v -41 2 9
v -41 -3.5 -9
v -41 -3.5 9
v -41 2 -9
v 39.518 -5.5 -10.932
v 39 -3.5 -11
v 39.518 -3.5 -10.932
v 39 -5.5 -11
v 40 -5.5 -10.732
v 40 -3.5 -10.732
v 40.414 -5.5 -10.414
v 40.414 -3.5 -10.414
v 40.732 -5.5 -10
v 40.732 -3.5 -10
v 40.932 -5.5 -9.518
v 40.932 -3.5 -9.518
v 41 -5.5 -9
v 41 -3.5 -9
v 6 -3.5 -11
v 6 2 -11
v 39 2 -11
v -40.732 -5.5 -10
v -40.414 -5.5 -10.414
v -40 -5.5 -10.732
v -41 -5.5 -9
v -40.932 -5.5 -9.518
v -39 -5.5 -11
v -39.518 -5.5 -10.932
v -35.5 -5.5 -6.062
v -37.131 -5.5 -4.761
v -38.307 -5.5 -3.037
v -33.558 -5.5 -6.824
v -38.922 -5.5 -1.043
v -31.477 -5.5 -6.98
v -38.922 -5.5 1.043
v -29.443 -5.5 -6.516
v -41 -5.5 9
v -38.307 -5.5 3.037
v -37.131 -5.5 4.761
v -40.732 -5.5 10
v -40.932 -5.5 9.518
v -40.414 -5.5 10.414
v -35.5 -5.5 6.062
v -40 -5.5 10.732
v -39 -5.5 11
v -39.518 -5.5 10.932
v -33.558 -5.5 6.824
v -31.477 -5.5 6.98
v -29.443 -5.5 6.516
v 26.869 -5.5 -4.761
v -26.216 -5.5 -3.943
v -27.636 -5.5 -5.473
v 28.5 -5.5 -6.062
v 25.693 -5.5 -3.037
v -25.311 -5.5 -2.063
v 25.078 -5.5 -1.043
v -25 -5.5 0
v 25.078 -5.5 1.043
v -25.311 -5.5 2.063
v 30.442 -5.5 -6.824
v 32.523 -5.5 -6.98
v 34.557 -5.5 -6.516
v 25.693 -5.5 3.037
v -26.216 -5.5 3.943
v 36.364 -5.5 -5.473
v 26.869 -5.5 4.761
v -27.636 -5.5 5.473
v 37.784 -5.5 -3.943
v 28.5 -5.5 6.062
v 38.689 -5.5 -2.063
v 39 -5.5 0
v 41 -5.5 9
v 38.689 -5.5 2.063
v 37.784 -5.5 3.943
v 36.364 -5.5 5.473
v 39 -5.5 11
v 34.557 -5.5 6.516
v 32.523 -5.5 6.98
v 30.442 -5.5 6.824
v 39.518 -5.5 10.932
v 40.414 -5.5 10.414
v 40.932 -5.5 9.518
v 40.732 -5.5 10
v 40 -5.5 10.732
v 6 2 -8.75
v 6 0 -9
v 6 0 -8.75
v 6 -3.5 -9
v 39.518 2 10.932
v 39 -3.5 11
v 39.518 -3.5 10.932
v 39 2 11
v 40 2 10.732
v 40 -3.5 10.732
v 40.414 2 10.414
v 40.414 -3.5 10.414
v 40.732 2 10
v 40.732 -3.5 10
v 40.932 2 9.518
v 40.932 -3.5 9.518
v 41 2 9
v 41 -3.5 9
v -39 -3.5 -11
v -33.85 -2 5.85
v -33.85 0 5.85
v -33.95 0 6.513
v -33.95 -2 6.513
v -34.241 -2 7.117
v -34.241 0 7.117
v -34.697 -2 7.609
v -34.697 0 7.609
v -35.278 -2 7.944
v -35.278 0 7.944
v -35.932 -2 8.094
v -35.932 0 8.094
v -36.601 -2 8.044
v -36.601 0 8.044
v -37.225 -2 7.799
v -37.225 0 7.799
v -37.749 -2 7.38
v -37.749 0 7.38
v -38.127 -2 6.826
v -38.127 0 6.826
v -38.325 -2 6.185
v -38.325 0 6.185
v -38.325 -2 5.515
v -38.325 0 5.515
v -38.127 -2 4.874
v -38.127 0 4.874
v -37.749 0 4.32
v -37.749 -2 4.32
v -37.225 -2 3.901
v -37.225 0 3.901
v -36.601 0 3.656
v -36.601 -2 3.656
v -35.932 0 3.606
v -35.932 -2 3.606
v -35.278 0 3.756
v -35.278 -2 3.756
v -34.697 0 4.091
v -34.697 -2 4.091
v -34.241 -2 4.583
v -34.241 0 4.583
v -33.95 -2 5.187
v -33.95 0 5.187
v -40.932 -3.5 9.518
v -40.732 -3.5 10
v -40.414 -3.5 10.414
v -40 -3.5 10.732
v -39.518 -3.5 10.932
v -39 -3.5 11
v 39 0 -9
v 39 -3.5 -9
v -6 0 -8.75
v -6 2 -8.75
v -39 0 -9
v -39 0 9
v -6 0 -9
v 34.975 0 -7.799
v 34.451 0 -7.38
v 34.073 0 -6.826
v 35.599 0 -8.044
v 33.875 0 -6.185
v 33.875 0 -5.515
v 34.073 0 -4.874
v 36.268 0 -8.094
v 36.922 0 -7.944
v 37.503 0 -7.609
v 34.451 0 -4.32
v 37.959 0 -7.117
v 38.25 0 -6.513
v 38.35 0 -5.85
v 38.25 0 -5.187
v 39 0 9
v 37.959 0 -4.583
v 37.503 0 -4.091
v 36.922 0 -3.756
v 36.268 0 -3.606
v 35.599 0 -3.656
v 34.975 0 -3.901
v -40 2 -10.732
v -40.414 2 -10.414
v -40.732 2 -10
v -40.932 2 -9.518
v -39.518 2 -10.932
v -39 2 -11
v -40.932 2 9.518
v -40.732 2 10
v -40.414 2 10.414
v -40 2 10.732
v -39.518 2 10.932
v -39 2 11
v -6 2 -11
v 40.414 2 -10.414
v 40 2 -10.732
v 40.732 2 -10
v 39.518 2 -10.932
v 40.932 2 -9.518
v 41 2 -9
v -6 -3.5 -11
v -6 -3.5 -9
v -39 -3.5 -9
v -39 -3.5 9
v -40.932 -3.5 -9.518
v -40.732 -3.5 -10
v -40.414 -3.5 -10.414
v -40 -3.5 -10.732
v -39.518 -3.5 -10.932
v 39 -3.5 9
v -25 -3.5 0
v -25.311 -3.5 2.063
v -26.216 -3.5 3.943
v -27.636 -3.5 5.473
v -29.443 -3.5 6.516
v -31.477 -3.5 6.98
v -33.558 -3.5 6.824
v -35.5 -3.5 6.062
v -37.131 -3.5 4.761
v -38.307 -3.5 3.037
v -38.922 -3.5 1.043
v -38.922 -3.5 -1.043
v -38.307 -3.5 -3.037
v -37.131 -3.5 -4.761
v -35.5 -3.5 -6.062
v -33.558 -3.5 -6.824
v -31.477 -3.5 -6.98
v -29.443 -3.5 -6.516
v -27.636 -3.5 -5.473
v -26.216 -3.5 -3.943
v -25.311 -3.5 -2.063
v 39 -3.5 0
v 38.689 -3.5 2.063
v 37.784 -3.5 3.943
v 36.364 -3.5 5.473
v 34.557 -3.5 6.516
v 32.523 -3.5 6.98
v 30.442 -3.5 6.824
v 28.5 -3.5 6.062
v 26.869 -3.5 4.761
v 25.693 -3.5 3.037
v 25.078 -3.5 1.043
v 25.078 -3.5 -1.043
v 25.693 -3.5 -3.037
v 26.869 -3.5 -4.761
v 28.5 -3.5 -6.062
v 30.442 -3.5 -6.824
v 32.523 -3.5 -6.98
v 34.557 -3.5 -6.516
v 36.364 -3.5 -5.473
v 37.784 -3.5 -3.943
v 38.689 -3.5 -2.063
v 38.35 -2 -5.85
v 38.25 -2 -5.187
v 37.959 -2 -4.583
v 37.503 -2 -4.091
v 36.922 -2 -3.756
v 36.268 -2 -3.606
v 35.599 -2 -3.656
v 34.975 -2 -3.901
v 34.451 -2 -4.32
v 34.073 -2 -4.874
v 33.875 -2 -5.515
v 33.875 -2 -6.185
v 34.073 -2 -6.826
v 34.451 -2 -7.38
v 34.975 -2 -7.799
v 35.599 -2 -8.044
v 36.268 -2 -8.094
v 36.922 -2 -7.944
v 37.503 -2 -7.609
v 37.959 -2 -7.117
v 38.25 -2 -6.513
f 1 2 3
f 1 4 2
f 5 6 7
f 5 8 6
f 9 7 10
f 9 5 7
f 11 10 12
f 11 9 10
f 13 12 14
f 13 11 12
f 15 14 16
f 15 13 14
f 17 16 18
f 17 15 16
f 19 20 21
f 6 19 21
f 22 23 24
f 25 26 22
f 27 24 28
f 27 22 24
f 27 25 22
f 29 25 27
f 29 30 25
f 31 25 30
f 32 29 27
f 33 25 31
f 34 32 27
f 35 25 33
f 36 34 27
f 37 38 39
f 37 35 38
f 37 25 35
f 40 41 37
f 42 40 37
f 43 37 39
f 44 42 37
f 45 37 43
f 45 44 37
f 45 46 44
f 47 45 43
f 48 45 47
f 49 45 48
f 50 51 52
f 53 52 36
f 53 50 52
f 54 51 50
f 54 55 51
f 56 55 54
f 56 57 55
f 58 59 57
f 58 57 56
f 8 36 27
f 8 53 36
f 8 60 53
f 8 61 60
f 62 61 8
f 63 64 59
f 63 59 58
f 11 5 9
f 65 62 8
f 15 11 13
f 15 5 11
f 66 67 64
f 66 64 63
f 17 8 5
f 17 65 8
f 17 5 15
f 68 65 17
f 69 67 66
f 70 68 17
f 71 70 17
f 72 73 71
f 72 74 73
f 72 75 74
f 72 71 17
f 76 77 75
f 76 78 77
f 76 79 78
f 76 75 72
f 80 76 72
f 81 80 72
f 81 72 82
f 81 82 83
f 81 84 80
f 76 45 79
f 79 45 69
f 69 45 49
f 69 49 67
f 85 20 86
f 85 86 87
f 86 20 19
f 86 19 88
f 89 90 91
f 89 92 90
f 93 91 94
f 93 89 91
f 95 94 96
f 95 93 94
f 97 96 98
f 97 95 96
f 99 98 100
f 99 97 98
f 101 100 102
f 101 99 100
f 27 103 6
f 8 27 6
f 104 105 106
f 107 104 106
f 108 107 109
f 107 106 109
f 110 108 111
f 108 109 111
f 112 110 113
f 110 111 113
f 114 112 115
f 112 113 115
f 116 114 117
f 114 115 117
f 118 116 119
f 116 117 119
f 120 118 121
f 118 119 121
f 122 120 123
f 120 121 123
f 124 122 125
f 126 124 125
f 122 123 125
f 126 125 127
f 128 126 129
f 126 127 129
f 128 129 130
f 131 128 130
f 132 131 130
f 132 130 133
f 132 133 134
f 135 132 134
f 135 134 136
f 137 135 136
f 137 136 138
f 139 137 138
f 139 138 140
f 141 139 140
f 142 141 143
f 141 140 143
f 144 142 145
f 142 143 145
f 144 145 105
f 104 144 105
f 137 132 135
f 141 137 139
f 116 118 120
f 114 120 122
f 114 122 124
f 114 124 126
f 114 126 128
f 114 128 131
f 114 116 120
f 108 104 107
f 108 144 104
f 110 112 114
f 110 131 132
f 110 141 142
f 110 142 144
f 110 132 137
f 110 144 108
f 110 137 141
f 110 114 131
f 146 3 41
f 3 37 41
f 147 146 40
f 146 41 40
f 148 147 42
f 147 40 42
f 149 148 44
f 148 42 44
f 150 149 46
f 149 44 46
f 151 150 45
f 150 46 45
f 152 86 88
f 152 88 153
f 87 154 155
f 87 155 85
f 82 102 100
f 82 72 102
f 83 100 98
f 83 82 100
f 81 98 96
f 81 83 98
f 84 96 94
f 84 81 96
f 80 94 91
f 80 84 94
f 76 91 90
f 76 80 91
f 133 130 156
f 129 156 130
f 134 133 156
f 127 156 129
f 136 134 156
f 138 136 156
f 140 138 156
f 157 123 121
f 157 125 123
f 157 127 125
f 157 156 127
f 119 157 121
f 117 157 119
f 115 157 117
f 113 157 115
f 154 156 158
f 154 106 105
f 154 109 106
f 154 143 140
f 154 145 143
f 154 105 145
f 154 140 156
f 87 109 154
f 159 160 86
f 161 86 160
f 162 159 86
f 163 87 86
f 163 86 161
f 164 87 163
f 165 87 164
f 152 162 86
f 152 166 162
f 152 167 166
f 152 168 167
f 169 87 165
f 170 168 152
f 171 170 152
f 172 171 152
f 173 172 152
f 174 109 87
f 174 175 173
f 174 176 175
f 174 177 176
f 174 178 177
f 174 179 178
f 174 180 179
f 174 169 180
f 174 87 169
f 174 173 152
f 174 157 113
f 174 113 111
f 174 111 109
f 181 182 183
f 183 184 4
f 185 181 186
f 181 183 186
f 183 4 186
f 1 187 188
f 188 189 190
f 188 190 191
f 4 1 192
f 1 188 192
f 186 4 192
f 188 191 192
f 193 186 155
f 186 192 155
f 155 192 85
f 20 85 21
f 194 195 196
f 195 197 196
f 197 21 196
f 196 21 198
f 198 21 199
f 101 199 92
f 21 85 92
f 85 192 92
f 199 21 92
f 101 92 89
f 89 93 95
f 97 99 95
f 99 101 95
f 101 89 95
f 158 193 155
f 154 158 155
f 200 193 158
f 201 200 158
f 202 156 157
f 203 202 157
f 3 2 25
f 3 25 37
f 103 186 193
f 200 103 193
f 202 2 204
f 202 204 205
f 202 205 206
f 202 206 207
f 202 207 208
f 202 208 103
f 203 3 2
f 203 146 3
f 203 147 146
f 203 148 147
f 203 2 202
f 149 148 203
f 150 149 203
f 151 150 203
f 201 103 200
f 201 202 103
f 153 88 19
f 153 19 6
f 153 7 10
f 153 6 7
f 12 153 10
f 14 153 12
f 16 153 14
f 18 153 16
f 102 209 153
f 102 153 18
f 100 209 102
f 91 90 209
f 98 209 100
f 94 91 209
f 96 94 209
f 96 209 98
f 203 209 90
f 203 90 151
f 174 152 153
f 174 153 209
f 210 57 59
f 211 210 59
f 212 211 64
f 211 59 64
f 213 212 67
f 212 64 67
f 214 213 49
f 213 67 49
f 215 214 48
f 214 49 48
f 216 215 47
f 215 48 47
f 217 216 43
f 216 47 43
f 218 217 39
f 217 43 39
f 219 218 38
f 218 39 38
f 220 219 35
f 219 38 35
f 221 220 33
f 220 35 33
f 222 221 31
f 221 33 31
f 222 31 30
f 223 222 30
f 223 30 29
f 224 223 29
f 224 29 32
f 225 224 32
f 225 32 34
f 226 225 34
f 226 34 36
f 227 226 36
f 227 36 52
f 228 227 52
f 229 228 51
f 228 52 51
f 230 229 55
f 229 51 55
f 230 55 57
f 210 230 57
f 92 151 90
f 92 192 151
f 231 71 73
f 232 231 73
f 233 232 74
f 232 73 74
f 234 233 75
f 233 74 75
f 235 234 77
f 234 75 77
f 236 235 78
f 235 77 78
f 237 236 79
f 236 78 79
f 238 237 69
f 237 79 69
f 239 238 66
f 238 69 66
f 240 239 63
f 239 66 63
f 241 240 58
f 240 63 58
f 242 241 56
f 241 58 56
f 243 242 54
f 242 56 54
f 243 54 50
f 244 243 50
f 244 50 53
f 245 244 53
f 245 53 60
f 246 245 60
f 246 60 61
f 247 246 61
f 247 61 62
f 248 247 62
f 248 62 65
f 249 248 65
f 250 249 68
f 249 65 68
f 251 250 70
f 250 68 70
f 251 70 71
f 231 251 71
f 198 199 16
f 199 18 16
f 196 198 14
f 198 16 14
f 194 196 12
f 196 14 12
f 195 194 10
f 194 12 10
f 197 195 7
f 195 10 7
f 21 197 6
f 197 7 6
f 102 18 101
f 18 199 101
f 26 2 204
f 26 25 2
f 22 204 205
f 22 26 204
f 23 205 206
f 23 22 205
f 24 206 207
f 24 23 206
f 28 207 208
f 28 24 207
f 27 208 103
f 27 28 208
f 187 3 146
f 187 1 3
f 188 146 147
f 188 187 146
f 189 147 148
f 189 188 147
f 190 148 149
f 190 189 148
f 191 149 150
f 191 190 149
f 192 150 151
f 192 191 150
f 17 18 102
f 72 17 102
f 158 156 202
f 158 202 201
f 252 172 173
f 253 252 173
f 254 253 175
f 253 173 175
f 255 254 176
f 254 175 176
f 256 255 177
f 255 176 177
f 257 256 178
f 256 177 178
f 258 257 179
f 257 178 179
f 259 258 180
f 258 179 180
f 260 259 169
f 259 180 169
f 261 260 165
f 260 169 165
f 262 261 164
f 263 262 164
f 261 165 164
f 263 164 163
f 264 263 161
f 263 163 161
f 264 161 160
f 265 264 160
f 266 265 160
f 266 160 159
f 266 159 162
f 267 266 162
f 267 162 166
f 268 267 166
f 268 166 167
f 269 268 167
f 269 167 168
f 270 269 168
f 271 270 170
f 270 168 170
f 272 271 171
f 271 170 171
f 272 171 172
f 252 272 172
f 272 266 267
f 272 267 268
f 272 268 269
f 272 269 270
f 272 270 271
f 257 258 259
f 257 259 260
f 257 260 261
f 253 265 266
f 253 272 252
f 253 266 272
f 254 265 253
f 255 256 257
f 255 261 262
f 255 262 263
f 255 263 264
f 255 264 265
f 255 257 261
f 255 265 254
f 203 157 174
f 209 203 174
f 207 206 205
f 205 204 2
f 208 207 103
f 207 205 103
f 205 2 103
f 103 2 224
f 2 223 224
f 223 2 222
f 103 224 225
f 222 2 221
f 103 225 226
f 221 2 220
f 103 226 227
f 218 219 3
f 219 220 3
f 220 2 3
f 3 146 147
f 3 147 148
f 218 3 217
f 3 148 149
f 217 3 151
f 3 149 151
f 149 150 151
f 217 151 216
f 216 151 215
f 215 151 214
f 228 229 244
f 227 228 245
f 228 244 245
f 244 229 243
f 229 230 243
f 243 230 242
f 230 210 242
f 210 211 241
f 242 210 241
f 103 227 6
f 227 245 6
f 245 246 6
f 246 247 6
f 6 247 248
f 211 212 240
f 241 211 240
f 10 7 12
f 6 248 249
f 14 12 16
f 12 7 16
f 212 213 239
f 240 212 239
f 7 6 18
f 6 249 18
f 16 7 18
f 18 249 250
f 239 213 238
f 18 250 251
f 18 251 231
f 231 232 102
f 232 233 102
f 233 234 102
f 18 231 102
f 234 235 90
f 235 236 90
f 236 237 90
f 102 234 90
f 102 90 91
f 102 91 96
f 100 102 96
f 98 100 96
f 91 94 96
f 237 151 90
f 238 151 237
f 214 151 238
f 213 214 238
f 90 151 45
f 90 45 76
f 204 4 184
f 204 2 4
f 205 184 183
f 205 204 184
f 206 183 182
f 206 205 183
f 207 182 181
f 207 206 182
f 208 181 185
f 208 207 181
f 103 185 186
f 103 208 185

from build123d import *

# Parameters (mm, degrees)
F0_W      = 82
F0_H      = 22
F2_DEPTH  = 2
F1_R      = 2.25
F3_DEPTH  = 2
F4_W      = 82
F4_H      = 22
F4_W_2    = 78
F4_H_2    = 18
F5_DEPTH  = 3.5
F6_W      = 12
F6_H      = 2.5
F7_DEPTH  = 5.5
F8_R      = 2
F9_W      = 82
F9_H      = 22
F10_DEPTH = 2
F11_R     = 2
F12_R     = 7
F13_DEPTH = 2


with BuildPart() as f2:
    # F0 (on Front) → F2 (new body)
    with BuildSketch(Plane.XZ):
        Rectangle(F0_W, F0_H)
    extrude(amount=-F2_DEPTH)

    # F1 (on Front) → F3 (join)
    with BuildSketch(Plane.XZ):
        with Locations((-36.1, 5.85)):
            Circle(F1_R)
        with Locations((36.1, -5.85)):
            Circle(F1_R)
    extrude(amount=F3_DEPTH)

    # F4 (on face) → F5 (join)
    with BuildSketch(Plane.XZ):
        Rectangle(F4_W, F4_H)
        Rectangle(F4_W_2, F4_H_2, mode=Mode.SUBTRACT)
    extrude(amount=F5_DEPTH)

    # F6 (on face) → F7 (cut, through all)
    with BuildSketch(Plane.XZ.offset(3.5)):
        with Locations((0, -10)):
            Rectangle(F6_W, F6_H)
    extrude(amount=-F7_DEPTH, mode=Mode.SUBTRACT)

    # F8
    f8_edges = [f2.edges().sort_by_distance(p)[0] for p in [
        (-41, -0.75, 11),
        (41, -0.75, 11),
        (41, -0.75, -11),
        (-41, -0.75, -11),
    ]]
    fillet(f8_edges, radius=F8_R)


with BuildPart() as f10:
    # F9 (on face) → F10 (new body)
    with BuildSketch(Plane.XZ.offset(3.5)):
        Rectangle(F9_W, F9_H)
    extrude(amount=F10_DEPTH)

    # F11
    f11_edges = [f10.edges().sort_by_distance(p)[0] for p in [
        (41, -4.5, 11),
        (41, -4.5, -11),
        (-41, -4.5, -11),
        (-41, -4.5, 11),
    ]]
    fillet(f11_edges, radius=F11_R)

    # F12 (on face) → F13 (cut)
    with BuildSketch(Plane.XZ.offset(5.5)):
        with Locations((-32, 0)):
            Circle(F12_R)
        with Locations((32, 0)):
            Circle(F12_R)
    extrude(amount=-F13_DEPTH, mode=Mode.SUBTRACT)


solid = Compound([f2.part, f10.part])
